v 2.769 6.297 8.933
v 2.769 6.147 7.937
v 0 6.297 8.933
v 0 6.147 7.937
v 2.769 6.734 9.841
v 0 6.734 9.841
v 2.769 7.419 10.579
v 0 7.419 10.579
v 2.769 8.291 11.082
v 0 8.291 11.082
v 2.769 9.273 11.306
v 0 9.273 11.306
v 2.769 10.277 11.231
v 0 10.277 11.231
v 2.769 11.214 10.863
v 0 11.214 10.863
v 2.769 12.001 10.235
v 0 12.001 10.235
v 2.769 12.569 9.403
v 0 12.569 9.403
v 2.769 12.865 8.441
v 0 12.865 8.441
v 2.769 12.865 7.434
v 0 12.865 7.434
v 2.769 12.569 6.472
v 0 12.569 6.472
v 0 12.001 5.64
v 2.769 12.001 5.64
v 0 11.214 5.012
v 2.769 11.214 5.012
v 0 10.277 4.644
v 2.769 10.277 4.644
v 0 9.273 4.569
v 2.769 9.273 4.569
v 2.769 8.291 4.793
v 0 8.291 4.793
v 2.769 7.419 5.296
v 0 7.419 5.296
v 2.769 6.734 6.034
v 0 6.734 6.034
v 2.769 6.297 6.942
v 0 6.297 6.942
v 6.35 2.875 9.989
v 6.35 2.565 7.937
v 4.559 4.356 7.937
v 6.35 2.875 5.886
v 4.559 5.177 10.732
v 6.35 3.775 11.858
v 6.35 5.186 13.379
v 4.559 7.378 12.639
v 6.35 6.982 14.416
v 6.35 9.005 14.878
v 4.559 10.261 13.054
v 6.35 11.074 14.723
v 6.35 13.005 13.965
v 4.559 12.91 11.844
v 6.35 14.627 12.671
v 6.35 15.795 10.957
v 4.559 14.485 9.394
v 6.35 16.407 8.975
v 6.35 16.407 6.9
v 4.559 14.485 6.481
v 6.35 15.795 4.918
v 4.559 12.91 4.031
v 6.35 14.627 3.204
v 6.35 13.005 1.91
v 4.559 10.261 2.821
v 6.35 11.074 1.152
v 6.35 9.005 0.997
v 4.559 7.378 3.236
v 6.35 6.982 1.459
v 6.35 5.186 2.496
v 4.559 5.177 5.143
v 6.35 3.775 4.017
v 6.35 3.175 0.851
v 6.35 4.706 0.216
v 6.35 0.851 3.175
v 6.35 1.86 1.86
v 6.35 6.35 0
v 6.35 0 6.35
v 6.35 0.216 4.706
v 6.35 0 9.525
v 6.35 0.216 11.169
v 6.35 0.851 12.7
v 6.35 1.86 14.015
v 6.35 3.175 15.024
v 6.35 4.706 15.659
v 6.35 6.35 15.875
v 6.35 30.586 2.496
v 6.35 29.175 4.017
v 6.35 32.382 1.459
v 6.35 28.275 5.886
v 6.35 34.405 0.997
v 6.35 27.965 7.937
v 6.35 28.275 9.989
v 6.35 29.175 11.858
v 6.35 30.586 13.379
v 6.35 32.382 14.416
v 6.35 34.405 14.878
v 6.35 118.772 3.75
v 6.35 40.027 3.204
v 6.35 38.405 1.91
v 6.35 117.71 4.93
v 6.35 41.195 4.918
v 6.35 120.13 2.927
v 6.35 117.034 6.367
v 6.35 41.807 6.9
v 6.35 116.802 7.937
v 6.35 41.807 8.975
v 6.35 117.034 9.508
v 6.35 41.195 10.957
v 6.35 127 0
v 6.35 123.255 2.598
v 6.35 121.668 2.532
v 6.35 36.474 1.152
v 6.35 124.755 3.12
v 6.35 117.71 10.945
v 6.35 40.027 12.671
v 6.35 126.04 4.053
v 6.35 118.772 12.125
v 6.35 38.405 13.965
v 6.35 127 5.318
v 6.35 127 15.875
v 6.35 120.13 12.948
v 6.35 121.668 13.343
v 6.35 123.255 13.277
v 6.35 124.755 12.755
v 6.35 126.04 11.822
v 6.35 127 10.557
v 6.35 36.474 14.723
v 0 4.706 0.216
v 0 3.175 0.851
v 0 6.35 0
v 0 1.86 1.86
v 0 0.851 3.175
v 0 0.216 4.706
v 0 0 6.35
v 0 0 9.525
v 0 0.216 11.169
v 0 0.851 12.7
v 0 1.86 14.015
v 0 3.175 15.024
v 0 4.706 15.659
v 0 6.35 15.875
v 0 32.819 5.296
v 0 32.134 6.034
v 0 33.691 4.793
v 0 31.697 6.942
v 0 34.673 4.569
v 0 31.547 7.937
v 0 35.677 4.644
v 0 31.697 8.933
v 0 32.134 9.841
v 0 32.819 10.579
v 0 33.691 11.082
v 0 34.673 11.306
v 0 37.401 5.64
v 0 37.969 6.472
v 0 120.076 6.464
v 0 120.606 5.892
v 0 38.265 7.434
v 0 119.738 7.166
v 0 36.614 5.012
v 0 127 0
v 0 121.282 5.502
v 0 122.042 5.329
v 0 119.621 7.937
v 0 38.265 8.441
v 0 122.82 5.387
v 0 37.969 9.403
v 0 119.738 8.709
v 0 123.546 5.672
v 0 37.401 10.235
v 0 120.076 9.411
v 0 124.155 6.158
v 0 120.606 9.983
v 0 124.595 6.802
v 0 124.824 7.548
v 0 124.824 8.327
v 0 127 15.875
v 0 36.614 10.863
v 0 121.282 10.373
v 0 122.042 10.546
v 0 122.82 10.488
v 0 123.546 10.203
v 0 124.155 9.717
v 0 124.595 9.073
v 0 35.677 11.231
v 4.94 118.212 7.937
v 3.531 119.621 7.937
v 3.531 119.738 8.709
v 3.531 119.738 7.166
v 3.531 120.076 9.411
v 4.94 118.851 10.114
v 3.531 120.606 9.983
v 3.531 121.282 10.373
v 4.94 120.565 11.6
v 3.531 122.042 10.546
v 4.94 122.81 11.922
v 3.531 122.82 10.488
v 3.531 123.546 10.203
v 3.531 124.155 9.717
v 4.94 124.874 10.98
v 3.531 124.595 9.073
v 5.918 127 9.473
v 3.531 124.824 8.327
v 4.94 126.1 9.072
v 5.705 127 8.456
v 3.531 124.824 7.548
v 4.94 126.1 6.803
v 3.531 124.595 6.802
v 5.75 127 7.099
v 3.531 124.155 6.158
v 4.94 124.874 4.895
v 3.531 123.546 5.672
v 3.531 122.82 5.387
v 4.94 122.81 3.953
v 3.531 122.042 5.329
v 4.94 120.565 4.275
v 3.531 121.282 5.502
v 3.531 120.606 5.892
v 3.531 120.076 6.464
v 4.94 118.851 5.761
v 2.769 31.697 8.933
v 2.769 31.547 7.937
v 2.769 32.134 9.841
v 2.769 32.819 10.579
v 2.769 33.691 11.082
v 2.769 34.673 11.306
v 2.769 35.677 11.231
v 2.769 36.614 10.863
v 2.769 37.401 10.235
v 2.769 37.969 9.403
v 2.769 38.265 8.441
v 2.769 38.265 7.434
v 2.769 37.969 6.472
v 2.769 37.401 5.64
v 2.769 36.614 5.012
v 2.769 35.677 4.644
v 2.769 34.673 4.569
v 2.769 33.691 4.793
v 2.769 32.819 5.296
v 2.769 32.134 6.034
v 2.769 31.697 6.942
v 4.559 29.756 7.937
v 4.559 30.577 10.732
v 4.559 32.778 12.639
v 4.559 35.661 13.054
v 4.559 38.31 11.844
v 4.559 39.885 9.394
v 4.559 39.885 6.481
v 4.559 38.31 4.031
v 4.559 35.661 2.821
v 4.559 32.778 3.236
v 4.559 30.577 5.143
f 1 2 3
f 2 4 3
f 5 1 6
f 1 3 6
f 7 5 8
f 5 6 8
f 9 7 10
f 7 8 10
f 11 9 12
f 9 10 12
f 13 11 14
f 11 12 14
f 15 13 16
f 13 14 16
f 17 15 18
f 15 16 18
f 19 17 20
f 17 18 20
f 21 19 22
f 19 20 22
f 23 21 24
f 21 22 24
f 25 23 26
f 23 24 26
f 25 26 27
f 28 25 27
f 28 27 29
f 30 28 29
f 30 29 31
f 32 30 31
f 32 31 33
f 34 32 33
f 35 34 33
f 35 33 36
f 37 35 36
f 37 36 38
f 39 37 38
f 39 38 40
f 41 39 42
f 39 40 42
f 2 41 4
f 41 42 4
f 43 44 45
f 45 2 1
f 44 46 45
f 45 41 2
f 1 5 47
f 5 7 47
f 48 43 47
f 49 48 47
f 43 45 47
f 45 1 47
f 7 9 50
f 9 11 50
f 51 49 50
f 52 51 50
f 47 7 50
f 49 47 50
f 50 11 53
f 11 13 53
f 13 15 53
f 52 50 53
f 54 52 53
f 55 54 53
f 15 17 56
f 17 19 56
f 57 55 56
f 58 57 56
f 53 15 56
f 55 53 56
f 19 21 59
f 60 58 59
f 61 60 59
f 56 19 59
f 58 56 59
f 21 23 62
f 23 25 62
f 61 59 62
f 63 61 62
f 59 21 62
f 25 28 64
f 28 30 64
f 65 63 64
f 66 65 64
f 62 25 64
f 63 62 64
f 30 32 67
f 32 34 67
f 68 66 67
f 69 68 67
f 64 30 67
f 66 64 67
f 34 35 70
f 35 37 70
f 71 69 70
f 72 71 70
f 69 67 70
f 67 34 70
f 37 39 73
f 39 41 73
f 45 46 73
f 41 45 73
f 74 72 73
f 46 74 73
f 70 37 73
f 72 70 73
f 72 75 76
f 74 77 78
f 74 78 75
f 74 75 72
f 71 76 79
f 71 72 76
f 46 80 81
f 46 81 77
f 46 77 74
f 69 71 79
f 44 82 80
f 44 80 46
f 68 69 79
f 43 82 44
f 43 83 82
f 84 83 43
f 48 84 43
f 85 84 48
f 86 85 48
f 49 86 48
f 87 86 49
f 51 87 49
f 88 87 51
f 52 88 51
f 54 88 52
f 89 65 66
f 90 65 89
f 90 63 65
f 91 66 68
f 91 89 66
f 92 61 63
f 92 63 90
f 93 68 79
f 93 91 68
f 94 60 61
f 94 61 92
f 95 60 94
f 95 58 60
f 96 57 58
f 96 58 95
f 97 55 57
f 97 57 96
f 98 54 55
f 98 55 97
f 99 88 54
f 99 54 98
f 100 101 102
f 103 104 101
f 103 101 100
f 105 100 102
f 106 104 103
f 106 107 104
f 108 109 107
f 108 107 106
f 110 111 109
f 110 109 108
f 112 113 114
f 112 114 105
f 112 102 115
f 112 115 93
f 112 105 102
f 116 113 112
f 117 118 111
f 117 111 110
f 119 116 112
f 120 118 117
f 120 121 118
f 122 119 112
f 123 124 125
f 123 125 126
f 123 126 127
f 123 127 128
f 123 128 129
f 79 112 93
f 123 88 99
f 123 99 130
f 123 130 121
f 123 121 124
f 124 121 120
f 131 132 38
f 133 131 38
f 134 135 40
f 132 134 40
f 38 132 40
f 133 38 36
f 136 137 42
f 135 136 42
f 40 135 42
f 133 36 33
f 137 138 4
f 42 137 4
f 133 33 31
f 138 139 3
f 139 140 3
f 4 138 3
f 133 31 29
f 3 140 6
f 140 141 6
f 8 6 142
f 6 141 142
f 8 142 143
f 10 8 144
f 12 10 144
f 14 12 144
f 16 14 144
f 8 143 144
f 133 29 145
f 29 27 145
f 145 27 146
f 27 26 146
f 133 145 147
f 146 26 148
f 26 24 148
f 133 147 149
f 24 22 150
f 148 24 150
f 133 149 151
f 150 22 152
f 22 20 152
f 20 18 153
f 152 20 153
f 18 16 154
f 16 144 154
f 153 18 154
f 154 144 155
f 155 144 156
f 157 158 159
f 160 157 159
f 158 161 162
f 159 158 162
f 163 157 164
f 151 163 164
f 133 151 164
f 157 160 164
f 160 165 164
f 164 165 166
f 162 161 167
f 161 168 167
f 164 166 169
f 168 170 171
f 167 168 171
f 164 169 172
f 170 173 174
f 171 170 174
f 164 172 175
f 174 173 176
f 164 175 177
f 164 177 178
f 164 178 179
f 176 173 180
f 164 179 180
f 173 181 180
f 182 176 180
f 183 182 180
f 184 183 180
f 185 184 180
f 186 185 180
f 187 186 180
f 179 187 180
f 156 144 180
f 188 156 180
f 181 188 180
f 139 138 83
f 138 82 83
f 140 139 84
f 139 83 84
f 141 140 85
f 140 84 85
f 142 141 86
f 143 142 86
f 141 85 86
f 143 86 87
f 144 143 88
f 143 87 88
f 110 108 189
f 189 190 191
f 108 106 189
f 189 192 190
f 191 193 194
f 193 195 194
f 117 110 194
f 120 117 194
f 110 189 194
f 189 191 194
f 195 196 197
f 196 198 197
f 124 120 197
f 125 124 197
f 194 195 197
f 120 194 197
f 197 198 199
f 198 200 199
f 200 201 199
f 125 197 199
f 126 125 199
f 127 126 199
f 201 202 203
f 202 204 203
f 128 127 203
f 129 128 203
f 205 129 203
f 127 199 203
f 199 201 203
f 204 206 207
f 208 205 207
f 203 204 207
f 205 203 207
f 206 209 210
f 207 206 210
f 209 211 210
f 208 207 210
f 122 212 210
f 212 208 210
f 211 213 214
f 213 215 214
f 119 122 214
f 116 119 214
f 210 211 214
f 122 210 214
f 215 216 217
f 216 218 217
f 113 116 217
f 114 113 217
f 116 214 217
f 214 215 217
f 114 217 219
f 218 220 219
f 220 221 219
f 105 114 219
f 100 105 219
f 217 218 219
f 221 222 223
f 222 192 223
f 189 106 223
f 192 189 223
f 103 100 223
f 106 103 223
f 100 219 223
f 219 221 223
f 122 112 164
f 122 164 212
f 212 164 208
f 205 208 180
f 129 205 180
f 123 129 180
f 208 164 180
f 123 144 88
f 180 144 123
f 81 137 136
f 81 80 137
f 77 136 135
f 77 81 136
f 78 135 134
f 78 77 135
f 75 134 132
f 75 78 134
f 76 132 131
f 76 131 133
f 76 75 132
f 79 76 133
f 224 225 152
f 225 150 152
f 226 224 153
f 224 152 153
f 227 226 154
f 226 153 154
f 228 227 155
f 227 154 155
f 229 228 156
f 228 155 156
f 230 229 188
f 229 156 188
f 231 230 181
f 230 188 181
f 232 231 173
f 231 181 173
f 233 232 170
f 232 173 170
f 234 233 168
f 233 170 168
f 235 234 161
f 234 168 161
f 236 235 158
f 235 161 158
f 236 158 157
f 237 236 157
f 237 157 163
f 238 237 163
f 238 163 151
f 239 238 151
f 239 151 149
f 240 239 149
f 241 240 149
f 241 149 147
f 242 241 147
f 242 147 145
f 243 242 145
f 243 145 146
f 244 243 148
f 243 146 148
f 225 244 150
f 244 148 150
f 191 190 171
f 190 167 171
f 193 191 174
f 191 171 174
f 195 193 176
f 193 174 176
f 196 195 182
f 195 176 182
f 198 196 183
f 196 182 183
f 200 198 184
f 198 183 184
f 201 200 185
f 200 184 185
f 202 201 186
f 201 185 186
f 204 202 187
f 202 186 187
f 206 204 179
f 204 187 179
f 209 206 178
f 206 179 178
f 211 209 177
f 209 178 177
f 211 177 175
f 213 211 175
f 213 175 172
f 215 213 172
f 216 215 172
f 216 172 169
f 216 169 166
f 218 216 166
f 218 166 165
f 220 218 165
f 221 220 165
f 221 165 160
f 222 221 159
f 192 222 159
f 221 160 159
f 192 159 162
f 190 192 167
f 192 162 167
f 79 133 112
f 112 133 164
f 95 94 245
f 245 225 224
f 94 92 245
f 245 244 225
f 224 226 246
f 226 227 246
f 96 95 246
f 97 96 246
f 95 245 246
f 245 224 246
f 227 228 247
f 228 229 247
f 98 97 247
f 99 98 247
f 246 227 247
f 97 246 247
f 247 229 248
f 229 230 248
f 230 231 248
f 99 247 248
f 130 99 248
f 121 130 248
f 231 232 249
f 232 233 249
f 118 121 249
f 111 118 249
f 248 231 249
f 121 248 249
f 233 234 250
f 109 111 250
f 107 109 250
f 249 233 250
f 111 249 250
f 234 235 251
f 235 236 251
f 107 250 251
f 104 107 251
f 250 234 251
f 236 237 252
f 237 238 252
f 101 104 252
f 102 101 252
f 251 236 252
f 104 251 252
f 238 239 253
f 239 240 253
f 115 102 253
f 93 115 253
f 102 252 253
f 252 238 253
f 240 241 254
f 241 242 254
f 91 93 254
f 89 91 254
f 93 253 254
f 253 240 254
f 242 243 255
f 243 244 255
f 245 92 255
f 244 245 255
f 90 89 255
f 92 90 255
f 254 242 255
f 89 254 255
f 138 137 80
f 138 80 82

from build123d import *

# Parameters (mm, degrees)
F0_W           = 127
F0_H           = 15.875
F1_DEPTH       = 6.35
F3_D           = 6.7564
F3_CSINK_D     = 13.9192
F3_CSINK_ANGLE = 90
F4_D           = 5.2324
F4_CSINK_D     = 10.8712
F4_CSINK_ANGLE = 90
F5_R           = 6.35


with BuildPart() as f1:
    # F0 (on Right) → F1 (new body)
    with BuildSketch(Plane.YZ):
        with Locations((63.5, 7.9375)):
            Rectangle(F0_W, F0_H)
    extrude(amount=F1_DEPTH)

    # F3 (through all)
    with Locations(Plane.YZ.offset(6.35)):
        with Locations((9.525, 7.9375), (34.925, 7.9375)):
            CounterSinkHole(F3_D / 2, F3_CSINK_D / 2, counter_sink_angle=F3_CSINK_ANGLE)

    # F4 (through all)
    with Locations(Plane.YZ.offset(6.35)):
        with Locations((122.2375, 7.9375)):
            CounterSinkHole(F4_D / 2, F4_CSINK_D / 2, counter_sink_angle=F4_CSINK_ANGLE)

    # F5
    f5_edges = [f1.edges().sort_by_distance(p)[0] for p in [
        (3.175, 0, 15.875),
        (3.175, 0, 0),
    ]]
    fillet(f5_edges, radius=F5_R)


solid = f1.part
